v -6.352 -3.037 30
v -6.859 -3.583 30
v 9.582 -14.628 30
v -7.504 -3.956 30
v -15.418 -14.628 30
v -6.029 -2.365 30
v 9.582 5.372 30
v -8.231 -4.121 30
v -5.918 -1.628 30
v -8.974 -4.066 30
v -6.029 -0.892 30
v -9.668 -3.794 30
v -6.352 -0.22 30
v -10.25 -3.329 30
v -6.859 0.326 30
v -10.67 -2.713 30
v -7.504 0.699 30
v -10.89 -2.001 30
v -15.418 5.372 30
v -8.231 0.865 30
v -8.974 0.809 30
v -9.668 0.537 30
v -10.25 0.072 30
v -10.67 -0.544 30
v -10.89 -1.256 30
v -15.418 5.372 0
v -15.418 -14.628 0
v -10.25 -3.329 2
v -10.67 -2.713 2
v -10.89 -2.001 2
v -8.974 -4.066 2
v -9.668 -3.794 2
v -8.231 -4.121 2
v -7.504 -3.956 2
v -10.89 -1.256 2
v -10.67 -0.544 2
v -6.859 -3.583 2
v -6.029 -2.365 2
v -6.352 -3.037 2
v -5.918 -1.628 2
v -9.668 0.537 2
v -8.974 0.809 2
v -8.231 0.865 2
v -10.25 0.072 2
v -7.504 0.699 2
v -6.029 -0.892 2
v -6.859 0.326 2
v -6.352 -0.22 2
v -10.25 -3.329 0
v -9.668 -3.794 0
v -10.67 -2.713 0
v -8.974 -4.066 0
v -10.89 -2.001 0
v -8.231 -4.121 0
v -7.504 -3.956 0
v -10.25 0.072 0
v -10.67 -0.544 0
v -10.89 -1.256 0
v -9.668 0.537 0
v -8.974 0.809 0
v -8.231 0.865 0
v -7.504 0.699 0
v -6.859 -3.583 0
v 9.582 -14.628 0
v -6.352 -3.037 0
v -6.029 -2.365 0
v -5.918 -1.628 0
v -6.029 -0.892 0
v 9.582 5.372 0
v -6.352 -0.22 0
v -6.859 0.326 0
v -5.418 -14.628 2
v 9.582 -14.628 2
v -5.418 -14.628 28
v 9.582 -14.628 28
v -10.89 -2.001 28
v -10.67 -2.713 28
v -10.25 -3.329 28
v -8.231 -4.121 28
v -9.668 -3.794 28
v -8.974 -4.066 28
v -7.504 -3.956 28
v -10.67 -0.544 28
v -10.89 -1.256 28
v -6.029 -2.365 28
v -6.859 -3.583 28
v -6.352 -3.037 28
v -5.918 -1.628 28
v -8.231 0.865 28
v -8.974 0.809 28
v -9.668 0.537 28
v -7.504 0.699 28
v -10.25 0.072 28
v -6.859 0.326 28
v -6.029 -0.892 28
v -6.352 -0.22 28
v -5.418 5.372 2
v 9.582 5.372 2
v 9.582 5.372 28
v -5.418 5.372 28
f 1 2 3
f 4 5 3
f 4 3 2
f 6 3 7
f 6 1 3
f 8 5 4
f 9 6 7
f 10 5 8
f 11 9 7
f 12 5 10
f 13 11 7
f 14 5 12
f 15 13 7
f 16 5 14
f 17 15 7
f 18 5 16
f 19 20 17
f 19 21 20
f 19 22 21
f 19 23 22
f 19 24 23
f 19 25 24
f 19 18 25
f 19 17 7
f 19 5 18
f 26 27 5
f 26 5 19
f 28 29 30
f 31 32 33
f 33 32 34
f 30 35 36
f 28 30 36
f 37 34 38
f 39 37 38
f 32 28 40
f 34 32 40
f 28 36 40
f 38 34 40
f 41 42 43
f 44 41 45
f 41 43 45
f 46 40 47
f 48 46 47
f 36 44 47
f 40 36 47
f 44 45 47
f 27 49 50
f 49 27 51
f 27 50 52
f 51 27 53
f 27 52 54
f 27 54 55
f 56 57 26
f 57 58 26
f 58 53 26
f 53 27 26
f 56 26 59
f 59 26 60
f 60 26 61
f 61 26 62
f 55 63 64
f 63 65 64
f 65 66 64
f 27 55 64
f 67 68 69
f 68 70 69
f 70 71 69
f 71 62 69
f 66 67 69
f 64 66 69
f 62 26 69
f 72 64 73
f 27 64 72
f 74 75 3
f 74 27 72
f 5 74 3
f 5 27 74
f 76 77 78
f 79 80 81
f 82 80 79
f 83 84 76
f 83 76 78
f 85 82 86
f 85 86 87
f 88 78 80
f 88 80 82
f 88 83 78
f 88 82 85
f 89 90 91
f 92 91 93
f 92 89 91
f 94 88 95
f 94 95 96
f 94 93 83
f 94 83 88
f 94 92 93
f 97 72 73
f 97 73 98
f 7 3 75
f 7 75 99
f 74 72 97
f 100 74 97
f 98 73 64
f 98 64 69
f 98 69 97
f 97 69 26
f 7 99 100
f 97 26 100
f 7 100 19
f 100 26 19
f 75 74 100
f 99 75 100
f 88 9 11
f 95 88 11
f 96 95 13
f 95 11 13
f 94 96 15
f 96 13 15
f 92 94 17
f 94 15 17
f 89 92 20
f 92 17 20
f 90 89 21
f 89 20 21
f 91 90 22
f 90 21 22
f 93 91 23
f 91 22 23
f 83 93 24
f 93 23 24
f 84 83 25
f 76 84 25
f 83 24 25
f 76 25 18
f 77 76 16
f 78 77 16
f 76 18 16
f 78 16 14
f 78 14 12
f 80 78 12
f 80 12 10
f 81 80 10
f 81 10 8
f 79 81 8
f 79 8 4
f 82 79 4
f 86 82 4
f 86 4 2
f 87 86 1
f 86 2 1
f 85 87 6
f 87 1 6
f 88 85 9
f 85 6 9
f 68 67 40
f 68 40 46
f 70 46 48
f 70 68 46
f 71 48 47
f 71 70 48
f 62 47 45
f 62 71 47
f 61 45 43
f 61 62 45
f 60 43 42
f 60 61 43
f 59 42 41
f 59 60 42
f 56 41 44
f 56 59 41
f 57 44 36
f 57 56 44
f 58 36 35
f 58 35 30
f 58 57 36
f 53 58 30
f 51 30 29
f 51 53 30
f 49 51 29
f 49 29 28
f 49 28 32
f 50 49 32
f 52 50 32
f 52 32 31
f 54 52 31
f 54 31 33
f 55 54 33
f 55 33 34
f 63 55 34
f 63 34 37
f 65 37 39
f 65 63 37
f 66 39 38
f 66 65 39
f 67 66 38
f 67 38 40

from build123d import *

# Parameters (mm, degrees)
F0_W     = 10
F0_H     = 20
F1_DEPTH = 30
F2_W     = 20
F2_H     = 2
F3_DEPTH = 15
F4_R     = 2.5
F5_DEPTH = 2
F6_R     = 2.5
F7_DEPTH = 2


with BuildPart() as f1:
    # F0 (on Top) → F1 (new body)
    with BuildSketch(Plane.XY):
        with Locations((-10.417764, -4.628471)):
            Rectangle(F0_W, F0_H)
    extrude(amount=F1_DEPTH)

    # F2 (on face) → F3 (join)
    with BuildSketch(Plane.YZ.offset(-5.417764)):
        with Locations((-4.628471, 29)):
            Rectangle(F2_W, F2_H)
        with Locations((-4.628471, 1)):
            Rectangle(F2_W, F2_H)
    extrude(amount=F3_DEPTH)

    # F4 (on Top) → F5 (cut)
    with BuildSketch(Plane.XY):
        with Locations((-8.417764, -1.628471)):
            Circle(F4_R)
    extrude(amount=F5_DEPTH, mode=Mode.SUBTRACT)

    # F6 (on face) → F7 (cut)
    with BuildSketch(Plane.XY.offset(30)):
        with Locations((-8.417764, -1.628471)):
            Circle(F6_R)
    extrude(amount=-F7_DEPTH, mode=Mode.SUBTRACT)


solid = f1.part
